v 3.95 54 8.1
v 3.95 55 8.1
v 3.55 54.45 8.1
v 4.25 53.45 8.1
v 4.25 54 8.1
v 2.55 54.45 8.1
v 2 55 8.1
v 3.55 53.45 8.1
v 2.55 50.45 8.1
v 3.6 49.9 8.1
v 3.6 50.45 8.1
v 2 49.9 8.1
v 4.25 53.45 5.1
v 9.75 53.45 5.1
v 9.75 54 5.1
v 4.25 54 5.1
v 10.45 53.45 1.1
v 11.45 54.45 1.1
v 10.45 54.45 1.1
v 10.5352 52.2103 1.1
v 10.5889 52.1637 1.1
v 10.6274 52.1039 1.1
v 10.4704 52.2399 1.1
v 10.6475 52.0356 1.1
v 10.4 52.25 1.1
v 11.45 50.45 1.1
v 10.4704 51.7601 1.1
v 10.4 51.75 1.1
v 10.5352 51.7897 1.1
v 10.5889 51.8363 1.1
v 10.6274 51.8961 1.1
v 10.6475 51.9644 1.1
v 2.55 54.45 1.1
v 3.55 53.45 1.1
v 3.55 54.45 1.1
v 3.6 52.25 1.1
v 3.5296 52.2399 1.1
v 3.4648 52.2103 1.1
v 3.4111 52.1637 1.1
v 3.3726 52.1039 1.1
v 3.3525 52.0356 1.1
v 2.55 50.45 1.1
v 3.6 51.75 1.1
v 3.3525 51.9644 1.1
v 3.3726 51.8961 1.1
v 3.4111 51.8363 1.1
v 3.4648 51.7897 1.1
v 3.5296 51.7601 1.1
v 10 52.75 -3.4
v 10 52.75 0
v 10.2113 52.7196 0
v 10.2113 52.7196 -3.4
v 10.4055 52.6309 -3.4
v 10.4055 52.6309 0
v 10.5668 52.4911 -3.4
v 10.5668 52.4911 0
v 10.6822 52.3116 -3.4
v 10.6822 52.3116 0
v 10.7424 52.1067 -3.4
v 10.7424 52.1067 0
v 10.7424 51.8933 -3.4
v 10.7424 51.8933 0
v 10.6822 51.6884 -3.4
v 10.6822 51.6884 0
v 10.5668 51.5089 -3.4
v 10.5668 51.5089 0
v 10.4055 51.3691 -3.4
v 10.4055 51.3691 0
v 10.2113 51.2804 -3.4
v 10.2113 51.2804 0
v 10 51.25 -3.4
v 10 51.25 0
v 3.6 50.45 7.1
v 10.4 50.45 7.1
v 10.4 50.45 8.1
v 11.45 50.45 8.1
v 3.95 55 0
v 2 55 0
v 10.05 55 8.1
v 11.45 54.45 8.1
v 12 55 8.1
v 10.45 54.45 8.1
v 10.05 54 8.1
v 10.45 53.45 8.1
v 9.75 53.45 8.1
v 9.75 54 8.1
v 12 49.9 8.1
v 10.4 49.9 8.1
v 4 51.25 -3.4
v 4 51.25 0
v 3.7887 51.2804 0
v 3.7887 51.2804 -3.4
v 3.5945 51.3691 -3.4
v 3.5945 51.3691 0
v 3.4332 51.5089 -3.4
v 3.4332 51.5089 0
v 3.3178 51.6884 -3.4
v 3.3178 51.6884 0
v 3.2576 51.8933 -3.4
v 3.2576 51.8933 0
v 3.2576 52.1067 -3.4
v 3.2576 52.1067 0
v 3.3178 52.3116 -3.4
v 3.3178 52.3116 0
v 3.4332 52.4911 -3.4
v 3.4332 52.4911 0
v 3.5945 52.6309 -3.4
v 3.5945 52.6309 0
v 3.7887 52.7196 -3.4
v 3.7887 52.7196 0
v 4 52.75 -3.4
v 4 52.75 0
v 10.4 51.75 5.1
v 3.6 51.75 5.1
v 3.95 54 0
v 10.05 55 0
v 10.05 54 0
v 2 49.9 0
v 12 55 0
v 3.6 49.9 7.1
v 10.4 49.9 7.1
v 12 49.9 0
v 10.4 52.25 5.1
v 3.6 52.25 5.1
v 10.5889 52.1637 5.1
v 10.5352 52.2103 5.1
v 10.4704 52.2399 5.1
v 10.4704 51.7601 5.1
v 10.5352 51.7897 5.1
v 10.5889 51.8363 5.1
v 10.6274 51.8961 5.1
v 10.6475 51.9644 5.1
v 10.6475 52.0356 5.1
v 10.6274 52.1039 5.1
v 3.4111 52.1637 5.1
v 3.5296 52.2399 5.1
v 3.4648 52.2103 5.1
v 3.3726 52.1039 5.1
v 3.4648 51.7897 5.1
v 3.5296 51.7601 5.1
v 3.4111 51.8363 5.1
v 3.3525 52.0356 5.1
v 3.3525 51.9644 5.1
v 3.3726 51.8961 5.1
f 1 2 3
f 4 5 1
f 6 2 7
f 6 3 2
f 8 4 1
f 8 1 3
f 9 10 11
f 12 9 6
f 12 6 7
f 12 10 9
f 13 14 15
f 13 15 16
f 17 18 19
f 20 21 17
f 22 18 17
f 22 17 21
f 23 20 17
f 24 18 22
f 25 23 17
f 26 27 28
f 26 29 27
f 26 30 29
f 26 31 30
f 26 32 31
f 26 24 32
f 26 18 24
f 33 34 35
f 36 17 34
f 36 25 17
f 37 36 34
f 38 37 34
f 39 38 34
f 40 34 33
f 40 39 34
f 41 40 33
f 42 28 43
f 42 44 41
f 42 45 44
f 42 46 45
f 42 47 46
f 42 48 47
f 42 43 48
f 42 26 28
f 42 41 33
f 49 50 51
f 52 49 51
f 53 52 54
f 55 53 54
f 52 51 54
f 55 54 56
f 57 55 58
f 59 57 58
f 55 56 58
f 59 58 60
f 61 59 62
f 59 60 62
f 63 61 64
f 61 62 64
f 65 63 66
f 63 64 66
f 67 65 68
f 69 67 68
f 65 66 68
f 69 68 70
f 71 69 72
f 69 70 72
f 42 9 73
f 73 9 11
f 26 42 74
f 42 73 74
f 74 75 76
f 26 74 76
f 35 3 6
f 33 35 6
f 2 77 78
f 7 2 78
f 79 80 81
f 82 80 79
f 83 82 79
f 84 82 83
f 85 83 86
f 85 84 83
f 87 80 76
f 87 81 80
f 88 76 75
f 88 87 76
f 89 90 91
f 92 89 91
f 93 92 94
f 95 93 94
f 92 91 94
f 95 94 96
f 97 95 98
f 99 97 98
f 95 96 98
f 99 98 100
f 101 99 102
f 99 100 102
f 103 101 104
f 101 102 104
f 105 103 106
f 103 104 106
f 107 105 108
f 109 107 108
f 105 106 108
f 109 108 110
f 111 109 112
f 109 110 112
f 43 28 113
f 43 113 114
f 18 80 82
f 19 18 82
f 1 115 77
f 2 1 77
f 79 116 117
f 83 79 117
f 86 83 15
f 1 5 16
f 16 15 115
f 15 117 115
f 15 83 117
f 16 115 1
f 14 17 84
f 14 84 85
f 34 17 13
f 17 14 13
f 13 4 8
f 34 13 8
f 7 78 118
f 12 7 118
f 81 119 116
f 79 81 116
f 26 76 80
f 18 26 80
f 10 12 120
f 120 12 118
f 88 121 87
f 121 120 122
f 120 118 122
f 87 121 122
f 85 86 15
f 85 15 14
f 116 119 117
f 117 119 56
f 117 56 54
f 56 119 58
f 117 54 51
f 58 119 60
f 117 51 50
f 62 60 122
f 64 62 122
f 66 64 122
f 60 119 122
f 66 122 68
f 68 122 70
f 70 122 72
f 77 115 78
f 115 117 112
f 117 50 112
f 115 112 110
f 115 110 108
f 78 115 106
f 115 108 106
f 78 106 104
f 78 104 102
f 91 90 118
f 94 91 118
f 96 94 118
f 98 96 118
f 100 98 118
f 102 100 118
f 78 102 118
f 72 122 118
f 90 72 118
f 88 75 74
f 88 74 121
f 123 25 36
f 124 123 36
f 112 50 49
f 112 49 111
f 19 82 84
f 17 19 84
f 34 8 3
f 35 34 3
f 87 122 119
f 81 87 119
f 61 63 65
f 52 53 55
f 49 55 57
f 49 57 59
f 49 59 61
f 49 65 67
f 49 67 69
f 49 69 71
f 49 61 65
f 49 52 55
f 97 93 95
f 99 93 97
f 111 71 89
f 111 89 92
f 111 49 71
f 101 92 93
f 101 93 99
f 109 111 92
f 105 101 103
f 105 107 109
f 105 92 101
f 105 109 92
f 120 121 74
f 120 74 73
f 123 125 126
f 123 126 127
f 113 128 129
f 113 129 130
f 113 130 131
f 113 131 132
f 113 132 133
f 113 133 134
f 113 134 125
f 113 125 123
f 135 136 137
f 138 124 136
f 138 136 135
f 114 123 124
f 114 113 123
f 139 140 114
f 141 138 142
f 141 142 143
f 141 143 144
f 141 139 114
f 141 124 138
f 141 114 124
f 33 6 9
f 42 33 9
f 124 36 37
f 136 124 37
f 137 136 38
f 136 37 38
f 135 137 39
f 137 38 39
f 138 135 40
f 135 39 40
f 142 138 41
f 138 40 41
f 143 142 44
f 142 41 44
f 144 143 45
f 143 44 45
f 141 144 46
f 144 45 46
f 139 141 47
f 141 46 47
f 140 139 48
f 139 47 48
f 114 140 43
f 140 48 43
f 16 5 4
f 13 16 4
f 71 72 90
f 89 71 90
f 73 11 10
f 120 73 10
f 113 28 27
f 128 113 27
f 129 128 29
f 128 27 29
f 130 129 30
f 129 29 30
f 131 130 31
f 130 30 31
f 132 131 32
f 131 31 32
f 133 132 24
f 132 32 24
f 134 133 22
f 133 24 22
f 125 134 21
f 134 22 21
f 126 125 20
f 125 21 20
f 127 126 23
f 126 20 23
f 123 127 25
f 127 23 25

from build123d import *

# Parameters (mm, degrees)
PAD005_DEPTH            = 8.1
POCKET003_DEPTH         = 7
SKETCH010_W             = 6.8
SKETCH010_H             = 5
POCKET004_DEPTH         = 1
SKETCH011_W             = 5.5
SKETCH011_H             = 3
POCKET005_DEPTH         = 3
PAD006_DEPTH            = 4
PAD014_DEPTH            = 3.4
BODY005_PLACEMENT_ANGLE = 180


with BuildPart() as part:
    # Sketch008 → Pad005 (new body)
    with BuildSketch(Plane.XY):
        Polygon((-5, 0), (-3.05, 0), (-3.05, 1), (3.05, 1), (3.05, 0), (5, 0), (5, 5.1), (-5, 5.1), align=None)
    extrude(amount=PAD005_DEPTH)

    # Sketch009 (on Face10 of Pad005) → Pocket003 (cut)
    with BuildSketch(Plane.XY.offset(8.1)):
        Polygon((-4.45, 0.55), (-3.45, 0.55), (-3.45, 1.55), (3.45, 1.55), (3.45, 0.55), (4.45, 0.55), (4.45, 4.55), (-4.45, 4.55), align=None)
    extrude(amount=-POCKET003_DEPTH, mode=Mode.SUBTRACT)

    # Sketch010 (on Face5 of Pocket003) → Pocket004 (cut)
    with BuildSketch(Plane.XY.offset(8.1)):
        with Locations((0, 5.5)):
            Rectangle(SKETCH010_W, SKETCH010_H)
    extrude(amount=-POCKET004_DEPTH, mode=Mode.SUBTRACT)

    # Sketch011 (on Face5 of Pocket004) → Pocket005 (cut)
    with BuildSketch(Plane.XY.offset(8.1)):
        with Locations((0, 1.5)):
            Rectangle(SKETCH011_W, SKETCH011_H)
    extrude(amount=-POCKET005_DEPTH, mode=Mode.SUBTRACT)

    # Sketch012 (on Face26 of Pocket005) → Pad006 (join)
    with BuildSketch(Plane.XY.offset(1.1)):
        with BuildLine():
            ThreePointArc((-3.4, 3.25), (-3.65, 3), (-3.4, 2.75))
            Line((-3.4, 2.75), (3.4, 2.75))
            ThreePointArc((3.4, 2.75), (3.65, 3), (3.4, 3.25))
            Line((-3.4, 3.25), (3.4, 3.25))
        make_face()
    extrude(amount=PAD006_DEPTH)

    # Sketch020 (on Face4 of Pad006) → Pad014 (join)
    with BuildSketch(Plane(origin=(0, 0, 0), x_dir=(1, 0, 0), z_dir=(0, 0, -1))):
        with BuildLine():
            ThreePointArc((-3, -2.25), (-3.75, -3), (-3, -3.75))
            Line((-3, -3.75), (3, -3.75))
            ThreePointArc((3, -3.75), (3.75, -3), (3, -2.25))
            Line((-3, -2.25), (3, -2.25))
        make_face()
    extrude(amount=PAD014_DEPTH)


with BuildPart() as part_1:
    # Body005 placement: moved
    add(part.part.moved(Location((-7, 29, 0))).rotate(Axis((-7, 29, 0), (0, 0, 1)), BODY005_PLACEMENT_ANGLE))


with BuildPart() as part_2:
    # Body012 placement: moved
    add(part_1.part.moved(Location((14, 26, 0))))


solid = part_2.part
